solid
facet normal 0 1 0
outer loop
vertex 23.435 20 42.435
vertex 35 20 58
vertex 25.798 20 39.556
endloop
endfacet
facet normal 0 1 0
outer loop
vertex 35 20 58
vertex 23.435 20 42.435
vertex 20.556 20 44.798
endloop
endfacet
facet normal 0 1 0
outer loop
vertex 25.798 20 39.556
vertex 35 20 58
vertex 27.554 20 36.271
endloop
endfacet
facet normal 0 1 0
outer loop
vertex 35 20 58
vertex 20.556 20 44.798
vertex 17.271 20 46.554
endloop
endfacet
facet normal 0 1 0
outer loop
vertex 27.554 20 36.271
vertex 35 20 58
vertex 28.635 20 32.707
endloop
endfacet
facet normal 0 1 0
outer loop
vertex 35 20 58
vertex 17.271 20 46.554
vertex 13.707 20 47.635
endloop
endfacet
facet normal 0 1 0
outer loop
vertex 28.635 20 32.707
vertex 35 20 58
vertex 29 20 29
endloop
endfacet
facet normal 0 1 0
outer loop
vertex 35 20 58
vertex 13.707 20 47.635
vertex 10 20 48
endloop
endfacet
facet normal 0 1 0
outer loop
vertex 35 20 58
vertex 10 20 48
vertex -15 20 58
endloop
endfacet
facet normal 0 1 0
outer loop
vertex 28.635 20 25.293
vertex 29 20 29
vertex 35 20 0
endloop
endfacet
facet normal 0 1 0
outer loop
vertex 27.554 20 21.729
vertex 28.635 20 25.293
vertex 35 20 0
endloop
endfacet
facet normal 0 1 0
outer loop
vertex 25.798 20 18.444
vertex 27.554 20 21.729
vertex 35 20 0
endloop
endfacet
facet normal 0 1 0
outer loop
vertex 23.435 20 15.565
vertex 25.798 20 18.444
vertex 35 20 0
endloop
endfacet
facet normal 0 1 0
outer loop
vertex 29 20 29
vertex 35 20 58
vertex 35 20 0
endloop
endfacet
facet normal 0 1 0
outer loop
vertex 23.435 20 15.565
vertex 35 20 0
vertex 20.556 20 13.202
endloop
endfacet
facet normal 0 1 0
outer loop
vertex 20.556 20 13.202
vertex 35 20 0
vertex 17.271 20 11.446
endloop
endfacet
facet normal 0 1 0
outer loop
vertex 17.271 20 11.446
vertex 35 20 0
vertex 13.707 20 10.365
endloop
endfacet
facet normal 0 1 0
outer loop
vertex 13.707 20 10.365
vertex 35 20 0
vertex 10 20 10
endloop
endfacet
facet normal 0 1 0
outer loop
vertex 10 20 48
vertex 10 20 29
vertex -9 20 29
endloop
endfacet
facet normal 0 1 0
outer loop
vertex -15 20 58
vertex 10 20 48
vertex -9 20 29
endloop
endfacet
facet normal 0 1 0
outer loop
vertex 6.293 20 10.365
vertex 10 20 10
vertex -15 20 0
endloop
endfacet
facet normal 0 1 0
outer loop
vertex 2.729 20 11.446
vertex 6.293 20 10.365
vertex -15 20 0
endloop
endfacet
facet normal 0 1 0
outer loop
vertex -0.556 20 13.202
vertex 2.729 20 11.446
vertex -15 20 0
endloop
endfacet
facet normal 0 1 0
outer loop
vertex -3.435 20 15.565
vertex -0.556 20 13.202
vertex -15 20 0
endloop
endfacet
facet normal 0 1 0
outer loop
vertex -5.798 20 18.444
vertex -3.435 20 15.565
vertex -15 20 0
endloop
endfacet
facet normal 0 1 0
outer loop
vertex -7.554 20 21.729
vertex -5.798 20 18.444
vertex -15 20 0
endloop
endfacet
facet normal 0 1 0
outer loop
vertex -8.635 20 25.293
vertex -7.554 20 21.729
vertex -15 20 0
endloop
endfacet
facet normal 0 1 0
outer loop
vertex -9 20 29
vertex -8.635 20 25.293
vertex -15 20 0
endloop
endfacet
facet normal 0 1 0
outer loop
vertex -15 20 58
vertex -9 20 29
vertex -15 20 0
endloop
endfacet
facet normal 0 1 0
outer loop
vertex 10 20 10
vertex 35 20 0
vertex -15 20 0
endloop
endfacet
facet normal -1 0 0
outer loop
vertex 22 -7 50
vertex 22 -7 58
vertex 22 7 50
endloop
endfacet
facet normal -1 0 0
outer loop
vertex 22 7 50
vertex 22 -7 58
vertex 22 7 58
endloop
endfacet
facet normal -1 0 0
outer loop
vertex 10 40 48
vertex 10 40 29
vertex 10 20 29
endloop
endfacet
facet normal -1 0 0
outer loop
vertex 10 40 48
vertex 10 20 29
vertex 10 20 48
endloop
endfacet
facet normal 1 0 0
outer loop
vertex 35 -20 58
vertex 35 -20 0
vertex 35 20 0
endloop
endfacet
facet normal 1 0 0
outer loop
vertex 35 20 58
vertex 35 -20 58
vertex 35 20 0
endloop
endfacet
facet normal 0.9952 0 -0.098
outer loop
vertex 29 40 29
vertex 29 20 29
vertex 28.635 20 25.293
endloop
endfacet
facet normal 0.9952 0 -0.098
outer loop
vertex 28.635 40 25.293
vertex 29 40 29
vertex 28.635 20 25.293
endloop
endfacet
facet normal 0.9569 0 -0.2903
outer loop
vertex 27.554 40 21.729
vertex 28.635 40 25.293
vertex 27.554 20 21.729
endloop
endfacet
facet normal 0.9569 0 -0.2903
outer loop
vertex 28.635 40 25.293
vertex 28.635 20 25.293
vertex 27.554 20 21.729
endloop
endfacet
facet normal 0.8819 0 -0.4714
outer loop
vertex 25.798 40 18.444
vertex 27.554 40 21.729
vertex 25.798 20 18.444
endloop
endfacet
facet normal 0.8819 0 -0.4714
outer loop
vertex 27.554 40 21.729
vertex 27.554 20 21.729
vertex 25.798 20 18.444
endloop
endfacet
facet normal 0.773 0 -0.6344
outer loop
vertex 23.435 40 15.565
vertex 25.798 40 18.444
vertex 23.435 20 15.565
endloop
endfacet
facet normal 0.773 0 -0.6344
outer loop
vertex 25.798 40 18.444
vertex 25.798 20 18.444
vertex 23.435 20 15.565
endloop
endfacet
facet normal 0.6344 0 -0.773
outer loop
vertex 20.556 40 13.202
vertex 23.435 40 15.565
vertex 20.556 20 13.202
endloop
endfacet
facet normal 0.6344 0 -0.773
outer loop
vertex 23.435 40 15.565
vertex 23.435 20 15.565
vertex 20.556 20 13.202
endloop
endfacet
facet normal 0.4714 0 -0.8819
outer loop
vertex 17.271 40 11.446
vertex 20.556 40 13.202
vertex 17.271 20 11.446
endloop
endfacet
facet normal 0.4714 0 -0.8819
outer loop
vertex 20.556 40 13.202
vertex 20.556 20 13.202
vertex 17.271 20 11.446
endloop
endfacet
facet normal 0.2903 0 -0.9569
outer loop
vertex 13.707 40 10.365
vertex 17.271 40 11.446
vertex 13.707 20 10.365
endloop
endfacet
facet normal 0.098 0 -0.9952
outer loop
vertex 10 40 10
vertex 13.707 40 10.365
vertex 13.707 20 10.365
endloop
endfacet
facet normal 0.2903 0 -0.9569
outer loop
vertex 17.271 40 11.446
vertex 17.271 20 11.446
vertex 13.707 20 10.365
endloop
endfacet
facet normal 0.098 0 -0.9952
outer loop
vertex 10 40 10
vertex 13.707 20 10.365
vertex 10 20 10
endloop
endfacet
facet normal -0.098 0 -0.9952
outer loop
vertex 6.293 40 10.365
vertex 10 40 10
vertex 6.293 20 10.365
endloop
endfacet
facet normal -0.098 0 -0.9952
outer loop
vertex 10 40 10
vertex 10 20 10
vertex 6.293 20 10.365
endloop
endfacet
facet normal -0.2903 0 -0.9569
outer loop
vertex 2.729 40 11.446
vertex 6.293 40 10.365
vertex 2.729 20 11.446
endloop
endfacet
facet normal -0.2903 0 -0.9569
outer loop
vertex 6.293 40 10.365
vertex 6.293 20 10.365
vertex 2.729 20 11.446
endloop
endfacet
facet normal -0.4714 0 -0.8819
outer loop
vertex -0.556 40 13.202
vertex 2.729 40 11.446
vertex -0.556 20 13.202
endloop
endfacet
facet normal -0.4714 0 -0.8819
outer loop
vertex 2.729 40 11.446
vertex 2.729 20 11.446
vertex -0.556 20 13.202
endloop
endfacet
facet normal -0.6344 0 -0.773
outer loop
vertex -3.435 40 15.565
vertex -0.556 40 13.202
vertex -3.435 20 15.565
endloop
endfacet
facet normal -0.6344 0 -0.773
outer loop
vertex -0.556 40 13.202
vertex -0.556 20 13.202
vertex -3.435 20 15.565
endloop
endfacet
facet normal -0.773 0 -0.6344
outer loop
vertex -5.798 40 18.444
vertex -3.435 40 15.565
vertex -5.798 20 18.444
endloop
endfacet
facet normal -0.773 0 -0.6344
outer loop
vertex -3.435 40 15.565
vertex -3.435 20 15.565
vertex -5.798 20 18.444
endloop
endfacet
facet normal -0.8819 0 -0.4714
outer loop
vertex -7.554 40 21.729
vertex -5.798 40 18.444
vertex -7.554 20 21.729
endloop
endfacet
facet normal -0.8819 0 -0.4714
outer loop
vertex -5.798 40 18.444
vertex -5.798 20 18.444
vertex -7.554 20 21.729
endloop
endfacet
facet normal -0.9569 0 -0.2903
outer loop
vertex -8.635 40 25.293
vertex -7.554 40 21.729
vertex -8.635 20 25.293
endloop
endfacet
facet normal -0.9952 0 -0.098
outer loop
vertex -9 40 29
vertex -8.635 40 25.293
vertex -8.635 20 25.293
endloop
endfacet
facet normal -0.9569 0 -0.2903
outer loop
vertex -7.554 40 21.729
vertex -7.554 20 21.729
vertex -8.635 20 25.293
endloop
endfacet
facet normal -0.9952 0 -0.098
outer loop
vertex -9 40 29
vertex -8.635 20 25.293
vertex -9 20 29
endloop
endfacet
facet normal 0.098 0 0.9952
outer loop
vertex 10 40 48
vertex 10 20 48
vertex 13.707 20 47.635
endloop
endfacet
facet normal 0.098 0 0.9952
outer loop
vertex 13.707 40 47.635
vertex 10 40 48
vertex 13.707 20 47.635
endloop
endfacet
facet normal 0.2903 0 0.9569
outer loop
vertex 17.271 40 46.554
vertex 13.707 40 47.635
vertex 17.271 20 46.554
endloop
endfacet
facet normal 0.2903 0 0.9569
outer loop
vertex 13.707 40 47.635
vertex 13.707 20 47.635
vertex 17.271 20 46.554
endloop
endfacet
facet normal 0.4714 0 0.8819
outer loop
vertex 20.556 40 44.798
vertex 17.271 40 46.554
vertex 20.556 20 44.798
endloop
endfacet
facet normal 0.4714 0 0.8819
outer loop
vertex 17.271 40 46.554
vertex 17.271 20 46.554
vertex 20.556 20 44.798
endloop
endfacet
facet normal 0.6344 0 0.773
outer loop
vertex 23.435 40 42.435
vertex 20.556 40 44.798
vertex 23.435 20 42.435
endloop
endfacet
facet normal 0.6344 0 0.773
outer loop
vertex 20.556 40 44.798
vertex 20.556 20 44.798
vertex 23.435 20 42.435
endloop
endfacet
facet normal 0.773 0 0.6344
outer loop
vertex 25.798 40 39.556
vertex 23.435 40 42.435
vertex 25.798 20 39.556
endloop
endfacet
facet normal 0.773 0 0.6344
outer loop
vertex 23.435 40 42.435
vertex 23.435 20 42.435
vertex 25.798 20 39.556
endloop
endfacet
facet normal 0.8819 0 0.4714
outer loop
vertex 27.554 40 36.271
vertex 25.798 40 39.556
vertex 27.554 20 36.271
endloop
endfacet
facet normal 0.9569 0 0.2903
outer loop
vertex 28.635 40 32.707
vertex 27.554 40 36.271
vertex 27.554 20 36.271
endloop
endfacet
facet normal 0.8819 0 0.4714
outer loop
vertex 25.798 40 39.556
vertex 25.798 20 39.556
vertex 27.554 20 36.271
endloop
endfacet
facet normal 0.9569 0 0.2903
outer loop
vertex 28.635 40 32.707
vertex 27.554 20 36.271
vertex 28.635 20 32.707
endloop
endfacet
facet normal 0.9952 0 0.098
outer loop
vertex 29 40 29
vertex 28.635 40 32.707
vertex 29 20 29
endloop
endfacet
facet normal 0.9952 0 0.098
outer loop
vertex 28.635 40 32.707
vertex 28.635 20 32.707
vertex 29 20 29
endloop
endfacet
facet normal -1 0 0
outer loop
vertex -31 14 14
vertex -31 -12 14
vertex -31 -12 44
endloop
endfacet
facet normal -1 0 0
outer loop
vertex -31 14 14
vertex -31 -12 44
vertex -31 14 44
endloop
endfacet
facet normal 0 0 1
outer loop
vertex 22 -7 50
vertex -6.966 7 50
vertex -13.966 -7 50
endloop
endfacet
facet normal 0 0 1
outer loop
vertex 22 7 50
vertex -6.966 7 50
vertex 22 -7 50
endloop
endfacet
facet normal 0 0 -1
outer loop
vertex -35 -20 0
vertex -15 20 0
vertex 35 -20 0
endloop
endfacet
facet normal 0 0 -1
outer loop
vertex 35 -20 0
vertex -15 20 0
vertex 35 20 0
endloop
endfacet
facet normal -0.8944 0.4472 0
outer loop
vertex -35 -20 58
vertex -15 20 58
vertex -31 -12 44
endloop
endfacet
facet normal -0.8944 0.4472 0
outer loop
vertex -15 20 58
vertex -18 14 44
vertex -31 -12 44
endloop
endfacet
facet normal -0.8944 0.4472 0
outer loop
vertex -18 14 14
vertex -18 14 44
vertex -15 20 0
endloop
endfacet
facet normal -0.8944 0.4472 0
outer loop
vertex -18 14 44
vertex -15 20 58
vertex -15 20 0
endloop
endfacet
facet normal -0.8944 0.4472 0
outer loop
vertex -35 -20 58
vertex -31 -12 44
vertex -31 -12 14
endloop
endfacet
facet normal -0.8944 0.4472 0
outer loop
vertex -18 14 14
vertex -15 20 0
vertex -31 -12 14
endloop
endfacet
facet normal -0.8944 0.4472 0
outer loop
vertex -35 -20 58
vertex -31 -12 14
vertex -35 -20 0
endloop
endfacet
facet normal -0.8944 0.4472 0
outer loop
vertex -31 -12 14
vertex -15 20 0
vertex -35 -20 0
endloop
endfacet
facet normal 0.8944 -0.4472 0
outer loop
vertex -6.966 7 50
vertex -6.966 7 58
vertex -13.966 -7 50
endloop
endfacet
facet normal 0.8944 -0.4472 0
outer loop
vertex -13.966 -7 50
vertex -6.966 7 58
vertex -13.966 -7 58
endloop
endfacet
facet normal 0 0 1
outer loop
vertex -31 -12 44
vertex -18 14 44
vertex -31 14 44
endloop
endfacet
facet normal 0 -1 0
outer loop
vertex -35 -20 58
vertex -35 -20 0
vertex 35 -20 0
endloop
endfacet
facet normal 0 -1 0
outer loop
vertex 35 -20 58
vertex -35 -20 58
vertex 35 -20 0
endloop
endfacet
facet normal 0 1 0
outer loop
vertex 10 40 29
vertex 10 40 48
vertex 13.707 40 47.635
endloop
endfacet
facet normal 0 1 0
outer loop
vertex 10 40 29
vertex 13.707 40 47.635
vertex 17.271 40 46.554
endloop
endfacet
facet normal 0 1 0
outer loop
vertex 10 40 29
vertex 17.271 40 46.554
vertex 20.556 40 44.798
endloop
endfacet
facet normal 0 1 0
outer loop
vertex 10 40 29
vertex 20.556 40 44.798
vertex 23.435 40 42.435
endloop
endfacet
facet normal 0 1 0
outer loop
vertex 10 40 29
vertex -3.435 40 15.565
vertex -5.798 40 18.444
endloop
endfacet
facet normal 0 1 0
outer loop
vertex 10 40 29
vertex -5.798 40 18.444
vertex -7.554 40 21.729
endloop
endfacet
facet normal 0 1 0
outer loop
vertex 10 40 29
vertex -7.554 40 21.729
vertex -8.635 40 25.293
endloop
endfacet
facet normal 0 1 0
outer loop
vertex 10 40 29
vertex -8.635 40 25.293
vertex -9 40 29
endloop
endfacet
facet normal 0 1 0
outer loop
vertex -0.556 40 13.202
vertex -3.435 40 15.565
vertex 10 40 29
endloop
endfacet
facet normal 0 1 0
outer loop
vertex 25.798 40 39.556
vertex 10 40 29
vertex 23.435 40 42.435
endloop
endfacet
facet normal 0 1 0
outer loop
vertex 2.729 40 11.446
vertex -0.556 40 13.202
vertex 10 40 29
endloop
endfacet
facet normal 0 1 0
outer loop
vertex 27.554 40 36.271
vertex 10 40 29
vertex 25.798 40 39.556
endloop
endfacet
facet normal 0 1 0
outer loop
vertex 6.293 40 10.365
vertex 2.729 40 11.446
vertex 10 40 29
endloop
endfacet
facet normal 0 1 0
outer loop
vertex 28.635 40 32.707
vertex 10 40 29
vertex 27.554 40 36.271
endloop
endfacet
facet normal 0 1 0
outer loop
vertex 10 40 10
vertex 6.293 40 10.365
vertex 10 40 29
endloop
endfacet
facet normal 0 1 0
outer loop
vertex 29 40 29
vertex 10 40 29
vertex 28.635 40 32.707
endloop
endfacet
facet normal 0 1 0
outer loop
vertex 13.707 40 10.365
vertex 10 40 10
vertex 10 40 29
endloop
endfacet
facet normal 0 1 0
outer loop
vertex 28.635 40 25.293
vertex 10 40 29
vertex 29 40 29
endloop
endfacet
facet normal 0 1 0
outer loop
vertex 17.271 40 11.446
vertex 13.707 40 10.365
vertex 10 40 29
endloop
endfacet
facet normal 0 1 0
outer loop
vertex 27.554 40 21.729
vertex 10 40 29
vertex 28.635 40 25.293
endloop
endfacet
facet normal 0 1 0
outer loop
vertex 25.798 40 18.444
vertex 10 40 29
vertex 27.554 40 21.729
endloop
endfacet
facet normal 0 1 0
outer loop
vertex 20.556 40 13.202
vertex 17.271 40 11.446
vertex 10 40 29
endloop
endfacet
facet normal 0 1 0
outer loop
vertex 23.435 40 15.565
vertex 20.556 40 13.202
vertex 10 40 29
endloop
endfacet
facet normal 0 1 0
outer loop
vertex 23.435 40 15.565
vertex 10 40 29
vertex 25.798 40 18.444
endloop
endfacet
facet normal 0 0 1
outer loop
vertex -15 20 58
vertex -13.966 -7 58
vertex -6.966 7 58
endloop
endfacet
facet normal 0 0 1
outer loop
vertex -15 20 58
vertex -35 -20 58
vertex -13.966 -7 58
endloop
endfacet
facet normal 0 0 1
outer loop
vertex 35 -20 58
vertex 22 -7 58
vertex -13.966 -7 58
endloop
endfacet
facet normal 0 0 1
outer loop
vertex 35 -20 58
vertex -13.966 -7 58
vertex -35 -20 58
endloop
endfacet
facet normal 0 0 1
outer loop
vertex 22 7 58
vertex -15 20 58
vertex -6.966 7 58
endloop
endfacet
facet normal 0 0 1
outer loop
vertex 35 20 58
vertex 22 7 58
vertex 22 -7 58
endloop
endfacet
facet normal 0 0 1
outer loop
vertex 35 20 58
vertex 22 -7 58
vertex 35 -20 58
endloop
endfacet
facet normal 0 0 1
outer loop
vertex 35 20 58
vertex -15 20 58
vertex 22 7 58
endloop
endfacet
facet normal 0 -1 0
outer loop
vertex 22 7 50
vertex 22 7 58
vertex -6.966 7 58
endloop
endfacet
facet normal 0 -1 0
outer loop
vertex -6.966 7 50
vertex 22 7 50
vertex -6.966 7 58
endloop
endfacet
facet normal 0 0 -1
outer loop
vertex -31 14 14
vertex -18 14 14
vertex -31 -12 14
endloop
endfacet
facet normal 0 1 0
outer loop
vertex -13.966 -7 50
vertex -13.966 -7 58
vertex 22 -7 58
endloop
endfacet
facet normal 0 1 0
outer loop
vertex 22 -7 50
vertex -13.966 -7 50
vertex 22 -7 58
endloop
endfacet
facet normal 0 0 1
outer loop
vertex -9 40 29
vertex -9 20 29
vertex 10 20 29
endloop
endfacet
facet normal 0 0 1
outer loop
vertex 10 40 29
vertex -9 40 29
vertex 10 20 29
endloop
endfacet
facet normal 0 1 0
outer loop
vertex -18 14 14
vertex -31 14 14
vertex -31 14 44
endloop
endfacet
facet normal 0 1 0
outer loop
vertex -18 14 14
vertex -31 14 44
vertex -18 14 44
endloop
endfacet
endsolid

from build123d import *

# Parameters (mm, degrees)
EXTRUDE_1_DEPTH      = 58
EXTRUDE_2_DEPTH      = 20
CUT_EXTRUDE_1_DEPTH  = 8
EXTRUDE_3_DEPTH      = 15
EXTRUDE_3_DEPTH_BACK = 15


with BuildPart() as part:
    # Эскиз1 → Бобышка-Вытянуть1 (new body)
    with BuildSketch(Plane.XY):
        Polygon((-15, 20), (-35, -20), (35, -20), (35, 20), align=None)
    extrude(amount=EXTRUDE_1_DEPTH)

    # Эскиз2 → Бобышка-Вытянуть2 (add)
    with BuildSketch(Plane(origin=(0, 20, 0), x_dir=(1, 0, 0), z_dir=(0, 1, 0))):
        with BuildLine():
            Line((29, -29), (10, -29))
            Line((10, -29), (10, -48))
            ThreePointArc((10, -48), (23.435028843, -42.435028843), (29, -29))
        make_face()
        with BuildLine():
            ThreePointArc((29, -29), (10, -10), (-9, -29))
            Line((-9, -29), (10, -29))
            Line((10, -29), (29, -29))
        make_face()
    extrude(amount=EXTRUDE_2_DEPTH)

    # Эскиз3 → Вырез-Вытянуть1 (cut)
    with BuildSketch(Plane.XY.offset(58)):
        Polygon((22, -7), (22, 7), (-6.965558146, 7), (-13.965558146, -7), align=None)
    extrude(amount=-CUT_EXTRUDE_1_DEPTH, mode=Mode.SUBTRACT)

    # Эскиз4 → Бобышка-Вытянуть3 (add, two sides: drawn at the far end of the back side and taken through both)
    with BuildSketch(Plane.XY.offset(29).offset(-EXTRUDE_3_DEPTH_BACK)):
        Polygon((-31, -12), (-31, 14), (-18, 14), align=None)
    extrude(amount=EXTRUDE_3_DEPTH + EXTRUDE_3_DEPTH_BACK)


solid = part.part
